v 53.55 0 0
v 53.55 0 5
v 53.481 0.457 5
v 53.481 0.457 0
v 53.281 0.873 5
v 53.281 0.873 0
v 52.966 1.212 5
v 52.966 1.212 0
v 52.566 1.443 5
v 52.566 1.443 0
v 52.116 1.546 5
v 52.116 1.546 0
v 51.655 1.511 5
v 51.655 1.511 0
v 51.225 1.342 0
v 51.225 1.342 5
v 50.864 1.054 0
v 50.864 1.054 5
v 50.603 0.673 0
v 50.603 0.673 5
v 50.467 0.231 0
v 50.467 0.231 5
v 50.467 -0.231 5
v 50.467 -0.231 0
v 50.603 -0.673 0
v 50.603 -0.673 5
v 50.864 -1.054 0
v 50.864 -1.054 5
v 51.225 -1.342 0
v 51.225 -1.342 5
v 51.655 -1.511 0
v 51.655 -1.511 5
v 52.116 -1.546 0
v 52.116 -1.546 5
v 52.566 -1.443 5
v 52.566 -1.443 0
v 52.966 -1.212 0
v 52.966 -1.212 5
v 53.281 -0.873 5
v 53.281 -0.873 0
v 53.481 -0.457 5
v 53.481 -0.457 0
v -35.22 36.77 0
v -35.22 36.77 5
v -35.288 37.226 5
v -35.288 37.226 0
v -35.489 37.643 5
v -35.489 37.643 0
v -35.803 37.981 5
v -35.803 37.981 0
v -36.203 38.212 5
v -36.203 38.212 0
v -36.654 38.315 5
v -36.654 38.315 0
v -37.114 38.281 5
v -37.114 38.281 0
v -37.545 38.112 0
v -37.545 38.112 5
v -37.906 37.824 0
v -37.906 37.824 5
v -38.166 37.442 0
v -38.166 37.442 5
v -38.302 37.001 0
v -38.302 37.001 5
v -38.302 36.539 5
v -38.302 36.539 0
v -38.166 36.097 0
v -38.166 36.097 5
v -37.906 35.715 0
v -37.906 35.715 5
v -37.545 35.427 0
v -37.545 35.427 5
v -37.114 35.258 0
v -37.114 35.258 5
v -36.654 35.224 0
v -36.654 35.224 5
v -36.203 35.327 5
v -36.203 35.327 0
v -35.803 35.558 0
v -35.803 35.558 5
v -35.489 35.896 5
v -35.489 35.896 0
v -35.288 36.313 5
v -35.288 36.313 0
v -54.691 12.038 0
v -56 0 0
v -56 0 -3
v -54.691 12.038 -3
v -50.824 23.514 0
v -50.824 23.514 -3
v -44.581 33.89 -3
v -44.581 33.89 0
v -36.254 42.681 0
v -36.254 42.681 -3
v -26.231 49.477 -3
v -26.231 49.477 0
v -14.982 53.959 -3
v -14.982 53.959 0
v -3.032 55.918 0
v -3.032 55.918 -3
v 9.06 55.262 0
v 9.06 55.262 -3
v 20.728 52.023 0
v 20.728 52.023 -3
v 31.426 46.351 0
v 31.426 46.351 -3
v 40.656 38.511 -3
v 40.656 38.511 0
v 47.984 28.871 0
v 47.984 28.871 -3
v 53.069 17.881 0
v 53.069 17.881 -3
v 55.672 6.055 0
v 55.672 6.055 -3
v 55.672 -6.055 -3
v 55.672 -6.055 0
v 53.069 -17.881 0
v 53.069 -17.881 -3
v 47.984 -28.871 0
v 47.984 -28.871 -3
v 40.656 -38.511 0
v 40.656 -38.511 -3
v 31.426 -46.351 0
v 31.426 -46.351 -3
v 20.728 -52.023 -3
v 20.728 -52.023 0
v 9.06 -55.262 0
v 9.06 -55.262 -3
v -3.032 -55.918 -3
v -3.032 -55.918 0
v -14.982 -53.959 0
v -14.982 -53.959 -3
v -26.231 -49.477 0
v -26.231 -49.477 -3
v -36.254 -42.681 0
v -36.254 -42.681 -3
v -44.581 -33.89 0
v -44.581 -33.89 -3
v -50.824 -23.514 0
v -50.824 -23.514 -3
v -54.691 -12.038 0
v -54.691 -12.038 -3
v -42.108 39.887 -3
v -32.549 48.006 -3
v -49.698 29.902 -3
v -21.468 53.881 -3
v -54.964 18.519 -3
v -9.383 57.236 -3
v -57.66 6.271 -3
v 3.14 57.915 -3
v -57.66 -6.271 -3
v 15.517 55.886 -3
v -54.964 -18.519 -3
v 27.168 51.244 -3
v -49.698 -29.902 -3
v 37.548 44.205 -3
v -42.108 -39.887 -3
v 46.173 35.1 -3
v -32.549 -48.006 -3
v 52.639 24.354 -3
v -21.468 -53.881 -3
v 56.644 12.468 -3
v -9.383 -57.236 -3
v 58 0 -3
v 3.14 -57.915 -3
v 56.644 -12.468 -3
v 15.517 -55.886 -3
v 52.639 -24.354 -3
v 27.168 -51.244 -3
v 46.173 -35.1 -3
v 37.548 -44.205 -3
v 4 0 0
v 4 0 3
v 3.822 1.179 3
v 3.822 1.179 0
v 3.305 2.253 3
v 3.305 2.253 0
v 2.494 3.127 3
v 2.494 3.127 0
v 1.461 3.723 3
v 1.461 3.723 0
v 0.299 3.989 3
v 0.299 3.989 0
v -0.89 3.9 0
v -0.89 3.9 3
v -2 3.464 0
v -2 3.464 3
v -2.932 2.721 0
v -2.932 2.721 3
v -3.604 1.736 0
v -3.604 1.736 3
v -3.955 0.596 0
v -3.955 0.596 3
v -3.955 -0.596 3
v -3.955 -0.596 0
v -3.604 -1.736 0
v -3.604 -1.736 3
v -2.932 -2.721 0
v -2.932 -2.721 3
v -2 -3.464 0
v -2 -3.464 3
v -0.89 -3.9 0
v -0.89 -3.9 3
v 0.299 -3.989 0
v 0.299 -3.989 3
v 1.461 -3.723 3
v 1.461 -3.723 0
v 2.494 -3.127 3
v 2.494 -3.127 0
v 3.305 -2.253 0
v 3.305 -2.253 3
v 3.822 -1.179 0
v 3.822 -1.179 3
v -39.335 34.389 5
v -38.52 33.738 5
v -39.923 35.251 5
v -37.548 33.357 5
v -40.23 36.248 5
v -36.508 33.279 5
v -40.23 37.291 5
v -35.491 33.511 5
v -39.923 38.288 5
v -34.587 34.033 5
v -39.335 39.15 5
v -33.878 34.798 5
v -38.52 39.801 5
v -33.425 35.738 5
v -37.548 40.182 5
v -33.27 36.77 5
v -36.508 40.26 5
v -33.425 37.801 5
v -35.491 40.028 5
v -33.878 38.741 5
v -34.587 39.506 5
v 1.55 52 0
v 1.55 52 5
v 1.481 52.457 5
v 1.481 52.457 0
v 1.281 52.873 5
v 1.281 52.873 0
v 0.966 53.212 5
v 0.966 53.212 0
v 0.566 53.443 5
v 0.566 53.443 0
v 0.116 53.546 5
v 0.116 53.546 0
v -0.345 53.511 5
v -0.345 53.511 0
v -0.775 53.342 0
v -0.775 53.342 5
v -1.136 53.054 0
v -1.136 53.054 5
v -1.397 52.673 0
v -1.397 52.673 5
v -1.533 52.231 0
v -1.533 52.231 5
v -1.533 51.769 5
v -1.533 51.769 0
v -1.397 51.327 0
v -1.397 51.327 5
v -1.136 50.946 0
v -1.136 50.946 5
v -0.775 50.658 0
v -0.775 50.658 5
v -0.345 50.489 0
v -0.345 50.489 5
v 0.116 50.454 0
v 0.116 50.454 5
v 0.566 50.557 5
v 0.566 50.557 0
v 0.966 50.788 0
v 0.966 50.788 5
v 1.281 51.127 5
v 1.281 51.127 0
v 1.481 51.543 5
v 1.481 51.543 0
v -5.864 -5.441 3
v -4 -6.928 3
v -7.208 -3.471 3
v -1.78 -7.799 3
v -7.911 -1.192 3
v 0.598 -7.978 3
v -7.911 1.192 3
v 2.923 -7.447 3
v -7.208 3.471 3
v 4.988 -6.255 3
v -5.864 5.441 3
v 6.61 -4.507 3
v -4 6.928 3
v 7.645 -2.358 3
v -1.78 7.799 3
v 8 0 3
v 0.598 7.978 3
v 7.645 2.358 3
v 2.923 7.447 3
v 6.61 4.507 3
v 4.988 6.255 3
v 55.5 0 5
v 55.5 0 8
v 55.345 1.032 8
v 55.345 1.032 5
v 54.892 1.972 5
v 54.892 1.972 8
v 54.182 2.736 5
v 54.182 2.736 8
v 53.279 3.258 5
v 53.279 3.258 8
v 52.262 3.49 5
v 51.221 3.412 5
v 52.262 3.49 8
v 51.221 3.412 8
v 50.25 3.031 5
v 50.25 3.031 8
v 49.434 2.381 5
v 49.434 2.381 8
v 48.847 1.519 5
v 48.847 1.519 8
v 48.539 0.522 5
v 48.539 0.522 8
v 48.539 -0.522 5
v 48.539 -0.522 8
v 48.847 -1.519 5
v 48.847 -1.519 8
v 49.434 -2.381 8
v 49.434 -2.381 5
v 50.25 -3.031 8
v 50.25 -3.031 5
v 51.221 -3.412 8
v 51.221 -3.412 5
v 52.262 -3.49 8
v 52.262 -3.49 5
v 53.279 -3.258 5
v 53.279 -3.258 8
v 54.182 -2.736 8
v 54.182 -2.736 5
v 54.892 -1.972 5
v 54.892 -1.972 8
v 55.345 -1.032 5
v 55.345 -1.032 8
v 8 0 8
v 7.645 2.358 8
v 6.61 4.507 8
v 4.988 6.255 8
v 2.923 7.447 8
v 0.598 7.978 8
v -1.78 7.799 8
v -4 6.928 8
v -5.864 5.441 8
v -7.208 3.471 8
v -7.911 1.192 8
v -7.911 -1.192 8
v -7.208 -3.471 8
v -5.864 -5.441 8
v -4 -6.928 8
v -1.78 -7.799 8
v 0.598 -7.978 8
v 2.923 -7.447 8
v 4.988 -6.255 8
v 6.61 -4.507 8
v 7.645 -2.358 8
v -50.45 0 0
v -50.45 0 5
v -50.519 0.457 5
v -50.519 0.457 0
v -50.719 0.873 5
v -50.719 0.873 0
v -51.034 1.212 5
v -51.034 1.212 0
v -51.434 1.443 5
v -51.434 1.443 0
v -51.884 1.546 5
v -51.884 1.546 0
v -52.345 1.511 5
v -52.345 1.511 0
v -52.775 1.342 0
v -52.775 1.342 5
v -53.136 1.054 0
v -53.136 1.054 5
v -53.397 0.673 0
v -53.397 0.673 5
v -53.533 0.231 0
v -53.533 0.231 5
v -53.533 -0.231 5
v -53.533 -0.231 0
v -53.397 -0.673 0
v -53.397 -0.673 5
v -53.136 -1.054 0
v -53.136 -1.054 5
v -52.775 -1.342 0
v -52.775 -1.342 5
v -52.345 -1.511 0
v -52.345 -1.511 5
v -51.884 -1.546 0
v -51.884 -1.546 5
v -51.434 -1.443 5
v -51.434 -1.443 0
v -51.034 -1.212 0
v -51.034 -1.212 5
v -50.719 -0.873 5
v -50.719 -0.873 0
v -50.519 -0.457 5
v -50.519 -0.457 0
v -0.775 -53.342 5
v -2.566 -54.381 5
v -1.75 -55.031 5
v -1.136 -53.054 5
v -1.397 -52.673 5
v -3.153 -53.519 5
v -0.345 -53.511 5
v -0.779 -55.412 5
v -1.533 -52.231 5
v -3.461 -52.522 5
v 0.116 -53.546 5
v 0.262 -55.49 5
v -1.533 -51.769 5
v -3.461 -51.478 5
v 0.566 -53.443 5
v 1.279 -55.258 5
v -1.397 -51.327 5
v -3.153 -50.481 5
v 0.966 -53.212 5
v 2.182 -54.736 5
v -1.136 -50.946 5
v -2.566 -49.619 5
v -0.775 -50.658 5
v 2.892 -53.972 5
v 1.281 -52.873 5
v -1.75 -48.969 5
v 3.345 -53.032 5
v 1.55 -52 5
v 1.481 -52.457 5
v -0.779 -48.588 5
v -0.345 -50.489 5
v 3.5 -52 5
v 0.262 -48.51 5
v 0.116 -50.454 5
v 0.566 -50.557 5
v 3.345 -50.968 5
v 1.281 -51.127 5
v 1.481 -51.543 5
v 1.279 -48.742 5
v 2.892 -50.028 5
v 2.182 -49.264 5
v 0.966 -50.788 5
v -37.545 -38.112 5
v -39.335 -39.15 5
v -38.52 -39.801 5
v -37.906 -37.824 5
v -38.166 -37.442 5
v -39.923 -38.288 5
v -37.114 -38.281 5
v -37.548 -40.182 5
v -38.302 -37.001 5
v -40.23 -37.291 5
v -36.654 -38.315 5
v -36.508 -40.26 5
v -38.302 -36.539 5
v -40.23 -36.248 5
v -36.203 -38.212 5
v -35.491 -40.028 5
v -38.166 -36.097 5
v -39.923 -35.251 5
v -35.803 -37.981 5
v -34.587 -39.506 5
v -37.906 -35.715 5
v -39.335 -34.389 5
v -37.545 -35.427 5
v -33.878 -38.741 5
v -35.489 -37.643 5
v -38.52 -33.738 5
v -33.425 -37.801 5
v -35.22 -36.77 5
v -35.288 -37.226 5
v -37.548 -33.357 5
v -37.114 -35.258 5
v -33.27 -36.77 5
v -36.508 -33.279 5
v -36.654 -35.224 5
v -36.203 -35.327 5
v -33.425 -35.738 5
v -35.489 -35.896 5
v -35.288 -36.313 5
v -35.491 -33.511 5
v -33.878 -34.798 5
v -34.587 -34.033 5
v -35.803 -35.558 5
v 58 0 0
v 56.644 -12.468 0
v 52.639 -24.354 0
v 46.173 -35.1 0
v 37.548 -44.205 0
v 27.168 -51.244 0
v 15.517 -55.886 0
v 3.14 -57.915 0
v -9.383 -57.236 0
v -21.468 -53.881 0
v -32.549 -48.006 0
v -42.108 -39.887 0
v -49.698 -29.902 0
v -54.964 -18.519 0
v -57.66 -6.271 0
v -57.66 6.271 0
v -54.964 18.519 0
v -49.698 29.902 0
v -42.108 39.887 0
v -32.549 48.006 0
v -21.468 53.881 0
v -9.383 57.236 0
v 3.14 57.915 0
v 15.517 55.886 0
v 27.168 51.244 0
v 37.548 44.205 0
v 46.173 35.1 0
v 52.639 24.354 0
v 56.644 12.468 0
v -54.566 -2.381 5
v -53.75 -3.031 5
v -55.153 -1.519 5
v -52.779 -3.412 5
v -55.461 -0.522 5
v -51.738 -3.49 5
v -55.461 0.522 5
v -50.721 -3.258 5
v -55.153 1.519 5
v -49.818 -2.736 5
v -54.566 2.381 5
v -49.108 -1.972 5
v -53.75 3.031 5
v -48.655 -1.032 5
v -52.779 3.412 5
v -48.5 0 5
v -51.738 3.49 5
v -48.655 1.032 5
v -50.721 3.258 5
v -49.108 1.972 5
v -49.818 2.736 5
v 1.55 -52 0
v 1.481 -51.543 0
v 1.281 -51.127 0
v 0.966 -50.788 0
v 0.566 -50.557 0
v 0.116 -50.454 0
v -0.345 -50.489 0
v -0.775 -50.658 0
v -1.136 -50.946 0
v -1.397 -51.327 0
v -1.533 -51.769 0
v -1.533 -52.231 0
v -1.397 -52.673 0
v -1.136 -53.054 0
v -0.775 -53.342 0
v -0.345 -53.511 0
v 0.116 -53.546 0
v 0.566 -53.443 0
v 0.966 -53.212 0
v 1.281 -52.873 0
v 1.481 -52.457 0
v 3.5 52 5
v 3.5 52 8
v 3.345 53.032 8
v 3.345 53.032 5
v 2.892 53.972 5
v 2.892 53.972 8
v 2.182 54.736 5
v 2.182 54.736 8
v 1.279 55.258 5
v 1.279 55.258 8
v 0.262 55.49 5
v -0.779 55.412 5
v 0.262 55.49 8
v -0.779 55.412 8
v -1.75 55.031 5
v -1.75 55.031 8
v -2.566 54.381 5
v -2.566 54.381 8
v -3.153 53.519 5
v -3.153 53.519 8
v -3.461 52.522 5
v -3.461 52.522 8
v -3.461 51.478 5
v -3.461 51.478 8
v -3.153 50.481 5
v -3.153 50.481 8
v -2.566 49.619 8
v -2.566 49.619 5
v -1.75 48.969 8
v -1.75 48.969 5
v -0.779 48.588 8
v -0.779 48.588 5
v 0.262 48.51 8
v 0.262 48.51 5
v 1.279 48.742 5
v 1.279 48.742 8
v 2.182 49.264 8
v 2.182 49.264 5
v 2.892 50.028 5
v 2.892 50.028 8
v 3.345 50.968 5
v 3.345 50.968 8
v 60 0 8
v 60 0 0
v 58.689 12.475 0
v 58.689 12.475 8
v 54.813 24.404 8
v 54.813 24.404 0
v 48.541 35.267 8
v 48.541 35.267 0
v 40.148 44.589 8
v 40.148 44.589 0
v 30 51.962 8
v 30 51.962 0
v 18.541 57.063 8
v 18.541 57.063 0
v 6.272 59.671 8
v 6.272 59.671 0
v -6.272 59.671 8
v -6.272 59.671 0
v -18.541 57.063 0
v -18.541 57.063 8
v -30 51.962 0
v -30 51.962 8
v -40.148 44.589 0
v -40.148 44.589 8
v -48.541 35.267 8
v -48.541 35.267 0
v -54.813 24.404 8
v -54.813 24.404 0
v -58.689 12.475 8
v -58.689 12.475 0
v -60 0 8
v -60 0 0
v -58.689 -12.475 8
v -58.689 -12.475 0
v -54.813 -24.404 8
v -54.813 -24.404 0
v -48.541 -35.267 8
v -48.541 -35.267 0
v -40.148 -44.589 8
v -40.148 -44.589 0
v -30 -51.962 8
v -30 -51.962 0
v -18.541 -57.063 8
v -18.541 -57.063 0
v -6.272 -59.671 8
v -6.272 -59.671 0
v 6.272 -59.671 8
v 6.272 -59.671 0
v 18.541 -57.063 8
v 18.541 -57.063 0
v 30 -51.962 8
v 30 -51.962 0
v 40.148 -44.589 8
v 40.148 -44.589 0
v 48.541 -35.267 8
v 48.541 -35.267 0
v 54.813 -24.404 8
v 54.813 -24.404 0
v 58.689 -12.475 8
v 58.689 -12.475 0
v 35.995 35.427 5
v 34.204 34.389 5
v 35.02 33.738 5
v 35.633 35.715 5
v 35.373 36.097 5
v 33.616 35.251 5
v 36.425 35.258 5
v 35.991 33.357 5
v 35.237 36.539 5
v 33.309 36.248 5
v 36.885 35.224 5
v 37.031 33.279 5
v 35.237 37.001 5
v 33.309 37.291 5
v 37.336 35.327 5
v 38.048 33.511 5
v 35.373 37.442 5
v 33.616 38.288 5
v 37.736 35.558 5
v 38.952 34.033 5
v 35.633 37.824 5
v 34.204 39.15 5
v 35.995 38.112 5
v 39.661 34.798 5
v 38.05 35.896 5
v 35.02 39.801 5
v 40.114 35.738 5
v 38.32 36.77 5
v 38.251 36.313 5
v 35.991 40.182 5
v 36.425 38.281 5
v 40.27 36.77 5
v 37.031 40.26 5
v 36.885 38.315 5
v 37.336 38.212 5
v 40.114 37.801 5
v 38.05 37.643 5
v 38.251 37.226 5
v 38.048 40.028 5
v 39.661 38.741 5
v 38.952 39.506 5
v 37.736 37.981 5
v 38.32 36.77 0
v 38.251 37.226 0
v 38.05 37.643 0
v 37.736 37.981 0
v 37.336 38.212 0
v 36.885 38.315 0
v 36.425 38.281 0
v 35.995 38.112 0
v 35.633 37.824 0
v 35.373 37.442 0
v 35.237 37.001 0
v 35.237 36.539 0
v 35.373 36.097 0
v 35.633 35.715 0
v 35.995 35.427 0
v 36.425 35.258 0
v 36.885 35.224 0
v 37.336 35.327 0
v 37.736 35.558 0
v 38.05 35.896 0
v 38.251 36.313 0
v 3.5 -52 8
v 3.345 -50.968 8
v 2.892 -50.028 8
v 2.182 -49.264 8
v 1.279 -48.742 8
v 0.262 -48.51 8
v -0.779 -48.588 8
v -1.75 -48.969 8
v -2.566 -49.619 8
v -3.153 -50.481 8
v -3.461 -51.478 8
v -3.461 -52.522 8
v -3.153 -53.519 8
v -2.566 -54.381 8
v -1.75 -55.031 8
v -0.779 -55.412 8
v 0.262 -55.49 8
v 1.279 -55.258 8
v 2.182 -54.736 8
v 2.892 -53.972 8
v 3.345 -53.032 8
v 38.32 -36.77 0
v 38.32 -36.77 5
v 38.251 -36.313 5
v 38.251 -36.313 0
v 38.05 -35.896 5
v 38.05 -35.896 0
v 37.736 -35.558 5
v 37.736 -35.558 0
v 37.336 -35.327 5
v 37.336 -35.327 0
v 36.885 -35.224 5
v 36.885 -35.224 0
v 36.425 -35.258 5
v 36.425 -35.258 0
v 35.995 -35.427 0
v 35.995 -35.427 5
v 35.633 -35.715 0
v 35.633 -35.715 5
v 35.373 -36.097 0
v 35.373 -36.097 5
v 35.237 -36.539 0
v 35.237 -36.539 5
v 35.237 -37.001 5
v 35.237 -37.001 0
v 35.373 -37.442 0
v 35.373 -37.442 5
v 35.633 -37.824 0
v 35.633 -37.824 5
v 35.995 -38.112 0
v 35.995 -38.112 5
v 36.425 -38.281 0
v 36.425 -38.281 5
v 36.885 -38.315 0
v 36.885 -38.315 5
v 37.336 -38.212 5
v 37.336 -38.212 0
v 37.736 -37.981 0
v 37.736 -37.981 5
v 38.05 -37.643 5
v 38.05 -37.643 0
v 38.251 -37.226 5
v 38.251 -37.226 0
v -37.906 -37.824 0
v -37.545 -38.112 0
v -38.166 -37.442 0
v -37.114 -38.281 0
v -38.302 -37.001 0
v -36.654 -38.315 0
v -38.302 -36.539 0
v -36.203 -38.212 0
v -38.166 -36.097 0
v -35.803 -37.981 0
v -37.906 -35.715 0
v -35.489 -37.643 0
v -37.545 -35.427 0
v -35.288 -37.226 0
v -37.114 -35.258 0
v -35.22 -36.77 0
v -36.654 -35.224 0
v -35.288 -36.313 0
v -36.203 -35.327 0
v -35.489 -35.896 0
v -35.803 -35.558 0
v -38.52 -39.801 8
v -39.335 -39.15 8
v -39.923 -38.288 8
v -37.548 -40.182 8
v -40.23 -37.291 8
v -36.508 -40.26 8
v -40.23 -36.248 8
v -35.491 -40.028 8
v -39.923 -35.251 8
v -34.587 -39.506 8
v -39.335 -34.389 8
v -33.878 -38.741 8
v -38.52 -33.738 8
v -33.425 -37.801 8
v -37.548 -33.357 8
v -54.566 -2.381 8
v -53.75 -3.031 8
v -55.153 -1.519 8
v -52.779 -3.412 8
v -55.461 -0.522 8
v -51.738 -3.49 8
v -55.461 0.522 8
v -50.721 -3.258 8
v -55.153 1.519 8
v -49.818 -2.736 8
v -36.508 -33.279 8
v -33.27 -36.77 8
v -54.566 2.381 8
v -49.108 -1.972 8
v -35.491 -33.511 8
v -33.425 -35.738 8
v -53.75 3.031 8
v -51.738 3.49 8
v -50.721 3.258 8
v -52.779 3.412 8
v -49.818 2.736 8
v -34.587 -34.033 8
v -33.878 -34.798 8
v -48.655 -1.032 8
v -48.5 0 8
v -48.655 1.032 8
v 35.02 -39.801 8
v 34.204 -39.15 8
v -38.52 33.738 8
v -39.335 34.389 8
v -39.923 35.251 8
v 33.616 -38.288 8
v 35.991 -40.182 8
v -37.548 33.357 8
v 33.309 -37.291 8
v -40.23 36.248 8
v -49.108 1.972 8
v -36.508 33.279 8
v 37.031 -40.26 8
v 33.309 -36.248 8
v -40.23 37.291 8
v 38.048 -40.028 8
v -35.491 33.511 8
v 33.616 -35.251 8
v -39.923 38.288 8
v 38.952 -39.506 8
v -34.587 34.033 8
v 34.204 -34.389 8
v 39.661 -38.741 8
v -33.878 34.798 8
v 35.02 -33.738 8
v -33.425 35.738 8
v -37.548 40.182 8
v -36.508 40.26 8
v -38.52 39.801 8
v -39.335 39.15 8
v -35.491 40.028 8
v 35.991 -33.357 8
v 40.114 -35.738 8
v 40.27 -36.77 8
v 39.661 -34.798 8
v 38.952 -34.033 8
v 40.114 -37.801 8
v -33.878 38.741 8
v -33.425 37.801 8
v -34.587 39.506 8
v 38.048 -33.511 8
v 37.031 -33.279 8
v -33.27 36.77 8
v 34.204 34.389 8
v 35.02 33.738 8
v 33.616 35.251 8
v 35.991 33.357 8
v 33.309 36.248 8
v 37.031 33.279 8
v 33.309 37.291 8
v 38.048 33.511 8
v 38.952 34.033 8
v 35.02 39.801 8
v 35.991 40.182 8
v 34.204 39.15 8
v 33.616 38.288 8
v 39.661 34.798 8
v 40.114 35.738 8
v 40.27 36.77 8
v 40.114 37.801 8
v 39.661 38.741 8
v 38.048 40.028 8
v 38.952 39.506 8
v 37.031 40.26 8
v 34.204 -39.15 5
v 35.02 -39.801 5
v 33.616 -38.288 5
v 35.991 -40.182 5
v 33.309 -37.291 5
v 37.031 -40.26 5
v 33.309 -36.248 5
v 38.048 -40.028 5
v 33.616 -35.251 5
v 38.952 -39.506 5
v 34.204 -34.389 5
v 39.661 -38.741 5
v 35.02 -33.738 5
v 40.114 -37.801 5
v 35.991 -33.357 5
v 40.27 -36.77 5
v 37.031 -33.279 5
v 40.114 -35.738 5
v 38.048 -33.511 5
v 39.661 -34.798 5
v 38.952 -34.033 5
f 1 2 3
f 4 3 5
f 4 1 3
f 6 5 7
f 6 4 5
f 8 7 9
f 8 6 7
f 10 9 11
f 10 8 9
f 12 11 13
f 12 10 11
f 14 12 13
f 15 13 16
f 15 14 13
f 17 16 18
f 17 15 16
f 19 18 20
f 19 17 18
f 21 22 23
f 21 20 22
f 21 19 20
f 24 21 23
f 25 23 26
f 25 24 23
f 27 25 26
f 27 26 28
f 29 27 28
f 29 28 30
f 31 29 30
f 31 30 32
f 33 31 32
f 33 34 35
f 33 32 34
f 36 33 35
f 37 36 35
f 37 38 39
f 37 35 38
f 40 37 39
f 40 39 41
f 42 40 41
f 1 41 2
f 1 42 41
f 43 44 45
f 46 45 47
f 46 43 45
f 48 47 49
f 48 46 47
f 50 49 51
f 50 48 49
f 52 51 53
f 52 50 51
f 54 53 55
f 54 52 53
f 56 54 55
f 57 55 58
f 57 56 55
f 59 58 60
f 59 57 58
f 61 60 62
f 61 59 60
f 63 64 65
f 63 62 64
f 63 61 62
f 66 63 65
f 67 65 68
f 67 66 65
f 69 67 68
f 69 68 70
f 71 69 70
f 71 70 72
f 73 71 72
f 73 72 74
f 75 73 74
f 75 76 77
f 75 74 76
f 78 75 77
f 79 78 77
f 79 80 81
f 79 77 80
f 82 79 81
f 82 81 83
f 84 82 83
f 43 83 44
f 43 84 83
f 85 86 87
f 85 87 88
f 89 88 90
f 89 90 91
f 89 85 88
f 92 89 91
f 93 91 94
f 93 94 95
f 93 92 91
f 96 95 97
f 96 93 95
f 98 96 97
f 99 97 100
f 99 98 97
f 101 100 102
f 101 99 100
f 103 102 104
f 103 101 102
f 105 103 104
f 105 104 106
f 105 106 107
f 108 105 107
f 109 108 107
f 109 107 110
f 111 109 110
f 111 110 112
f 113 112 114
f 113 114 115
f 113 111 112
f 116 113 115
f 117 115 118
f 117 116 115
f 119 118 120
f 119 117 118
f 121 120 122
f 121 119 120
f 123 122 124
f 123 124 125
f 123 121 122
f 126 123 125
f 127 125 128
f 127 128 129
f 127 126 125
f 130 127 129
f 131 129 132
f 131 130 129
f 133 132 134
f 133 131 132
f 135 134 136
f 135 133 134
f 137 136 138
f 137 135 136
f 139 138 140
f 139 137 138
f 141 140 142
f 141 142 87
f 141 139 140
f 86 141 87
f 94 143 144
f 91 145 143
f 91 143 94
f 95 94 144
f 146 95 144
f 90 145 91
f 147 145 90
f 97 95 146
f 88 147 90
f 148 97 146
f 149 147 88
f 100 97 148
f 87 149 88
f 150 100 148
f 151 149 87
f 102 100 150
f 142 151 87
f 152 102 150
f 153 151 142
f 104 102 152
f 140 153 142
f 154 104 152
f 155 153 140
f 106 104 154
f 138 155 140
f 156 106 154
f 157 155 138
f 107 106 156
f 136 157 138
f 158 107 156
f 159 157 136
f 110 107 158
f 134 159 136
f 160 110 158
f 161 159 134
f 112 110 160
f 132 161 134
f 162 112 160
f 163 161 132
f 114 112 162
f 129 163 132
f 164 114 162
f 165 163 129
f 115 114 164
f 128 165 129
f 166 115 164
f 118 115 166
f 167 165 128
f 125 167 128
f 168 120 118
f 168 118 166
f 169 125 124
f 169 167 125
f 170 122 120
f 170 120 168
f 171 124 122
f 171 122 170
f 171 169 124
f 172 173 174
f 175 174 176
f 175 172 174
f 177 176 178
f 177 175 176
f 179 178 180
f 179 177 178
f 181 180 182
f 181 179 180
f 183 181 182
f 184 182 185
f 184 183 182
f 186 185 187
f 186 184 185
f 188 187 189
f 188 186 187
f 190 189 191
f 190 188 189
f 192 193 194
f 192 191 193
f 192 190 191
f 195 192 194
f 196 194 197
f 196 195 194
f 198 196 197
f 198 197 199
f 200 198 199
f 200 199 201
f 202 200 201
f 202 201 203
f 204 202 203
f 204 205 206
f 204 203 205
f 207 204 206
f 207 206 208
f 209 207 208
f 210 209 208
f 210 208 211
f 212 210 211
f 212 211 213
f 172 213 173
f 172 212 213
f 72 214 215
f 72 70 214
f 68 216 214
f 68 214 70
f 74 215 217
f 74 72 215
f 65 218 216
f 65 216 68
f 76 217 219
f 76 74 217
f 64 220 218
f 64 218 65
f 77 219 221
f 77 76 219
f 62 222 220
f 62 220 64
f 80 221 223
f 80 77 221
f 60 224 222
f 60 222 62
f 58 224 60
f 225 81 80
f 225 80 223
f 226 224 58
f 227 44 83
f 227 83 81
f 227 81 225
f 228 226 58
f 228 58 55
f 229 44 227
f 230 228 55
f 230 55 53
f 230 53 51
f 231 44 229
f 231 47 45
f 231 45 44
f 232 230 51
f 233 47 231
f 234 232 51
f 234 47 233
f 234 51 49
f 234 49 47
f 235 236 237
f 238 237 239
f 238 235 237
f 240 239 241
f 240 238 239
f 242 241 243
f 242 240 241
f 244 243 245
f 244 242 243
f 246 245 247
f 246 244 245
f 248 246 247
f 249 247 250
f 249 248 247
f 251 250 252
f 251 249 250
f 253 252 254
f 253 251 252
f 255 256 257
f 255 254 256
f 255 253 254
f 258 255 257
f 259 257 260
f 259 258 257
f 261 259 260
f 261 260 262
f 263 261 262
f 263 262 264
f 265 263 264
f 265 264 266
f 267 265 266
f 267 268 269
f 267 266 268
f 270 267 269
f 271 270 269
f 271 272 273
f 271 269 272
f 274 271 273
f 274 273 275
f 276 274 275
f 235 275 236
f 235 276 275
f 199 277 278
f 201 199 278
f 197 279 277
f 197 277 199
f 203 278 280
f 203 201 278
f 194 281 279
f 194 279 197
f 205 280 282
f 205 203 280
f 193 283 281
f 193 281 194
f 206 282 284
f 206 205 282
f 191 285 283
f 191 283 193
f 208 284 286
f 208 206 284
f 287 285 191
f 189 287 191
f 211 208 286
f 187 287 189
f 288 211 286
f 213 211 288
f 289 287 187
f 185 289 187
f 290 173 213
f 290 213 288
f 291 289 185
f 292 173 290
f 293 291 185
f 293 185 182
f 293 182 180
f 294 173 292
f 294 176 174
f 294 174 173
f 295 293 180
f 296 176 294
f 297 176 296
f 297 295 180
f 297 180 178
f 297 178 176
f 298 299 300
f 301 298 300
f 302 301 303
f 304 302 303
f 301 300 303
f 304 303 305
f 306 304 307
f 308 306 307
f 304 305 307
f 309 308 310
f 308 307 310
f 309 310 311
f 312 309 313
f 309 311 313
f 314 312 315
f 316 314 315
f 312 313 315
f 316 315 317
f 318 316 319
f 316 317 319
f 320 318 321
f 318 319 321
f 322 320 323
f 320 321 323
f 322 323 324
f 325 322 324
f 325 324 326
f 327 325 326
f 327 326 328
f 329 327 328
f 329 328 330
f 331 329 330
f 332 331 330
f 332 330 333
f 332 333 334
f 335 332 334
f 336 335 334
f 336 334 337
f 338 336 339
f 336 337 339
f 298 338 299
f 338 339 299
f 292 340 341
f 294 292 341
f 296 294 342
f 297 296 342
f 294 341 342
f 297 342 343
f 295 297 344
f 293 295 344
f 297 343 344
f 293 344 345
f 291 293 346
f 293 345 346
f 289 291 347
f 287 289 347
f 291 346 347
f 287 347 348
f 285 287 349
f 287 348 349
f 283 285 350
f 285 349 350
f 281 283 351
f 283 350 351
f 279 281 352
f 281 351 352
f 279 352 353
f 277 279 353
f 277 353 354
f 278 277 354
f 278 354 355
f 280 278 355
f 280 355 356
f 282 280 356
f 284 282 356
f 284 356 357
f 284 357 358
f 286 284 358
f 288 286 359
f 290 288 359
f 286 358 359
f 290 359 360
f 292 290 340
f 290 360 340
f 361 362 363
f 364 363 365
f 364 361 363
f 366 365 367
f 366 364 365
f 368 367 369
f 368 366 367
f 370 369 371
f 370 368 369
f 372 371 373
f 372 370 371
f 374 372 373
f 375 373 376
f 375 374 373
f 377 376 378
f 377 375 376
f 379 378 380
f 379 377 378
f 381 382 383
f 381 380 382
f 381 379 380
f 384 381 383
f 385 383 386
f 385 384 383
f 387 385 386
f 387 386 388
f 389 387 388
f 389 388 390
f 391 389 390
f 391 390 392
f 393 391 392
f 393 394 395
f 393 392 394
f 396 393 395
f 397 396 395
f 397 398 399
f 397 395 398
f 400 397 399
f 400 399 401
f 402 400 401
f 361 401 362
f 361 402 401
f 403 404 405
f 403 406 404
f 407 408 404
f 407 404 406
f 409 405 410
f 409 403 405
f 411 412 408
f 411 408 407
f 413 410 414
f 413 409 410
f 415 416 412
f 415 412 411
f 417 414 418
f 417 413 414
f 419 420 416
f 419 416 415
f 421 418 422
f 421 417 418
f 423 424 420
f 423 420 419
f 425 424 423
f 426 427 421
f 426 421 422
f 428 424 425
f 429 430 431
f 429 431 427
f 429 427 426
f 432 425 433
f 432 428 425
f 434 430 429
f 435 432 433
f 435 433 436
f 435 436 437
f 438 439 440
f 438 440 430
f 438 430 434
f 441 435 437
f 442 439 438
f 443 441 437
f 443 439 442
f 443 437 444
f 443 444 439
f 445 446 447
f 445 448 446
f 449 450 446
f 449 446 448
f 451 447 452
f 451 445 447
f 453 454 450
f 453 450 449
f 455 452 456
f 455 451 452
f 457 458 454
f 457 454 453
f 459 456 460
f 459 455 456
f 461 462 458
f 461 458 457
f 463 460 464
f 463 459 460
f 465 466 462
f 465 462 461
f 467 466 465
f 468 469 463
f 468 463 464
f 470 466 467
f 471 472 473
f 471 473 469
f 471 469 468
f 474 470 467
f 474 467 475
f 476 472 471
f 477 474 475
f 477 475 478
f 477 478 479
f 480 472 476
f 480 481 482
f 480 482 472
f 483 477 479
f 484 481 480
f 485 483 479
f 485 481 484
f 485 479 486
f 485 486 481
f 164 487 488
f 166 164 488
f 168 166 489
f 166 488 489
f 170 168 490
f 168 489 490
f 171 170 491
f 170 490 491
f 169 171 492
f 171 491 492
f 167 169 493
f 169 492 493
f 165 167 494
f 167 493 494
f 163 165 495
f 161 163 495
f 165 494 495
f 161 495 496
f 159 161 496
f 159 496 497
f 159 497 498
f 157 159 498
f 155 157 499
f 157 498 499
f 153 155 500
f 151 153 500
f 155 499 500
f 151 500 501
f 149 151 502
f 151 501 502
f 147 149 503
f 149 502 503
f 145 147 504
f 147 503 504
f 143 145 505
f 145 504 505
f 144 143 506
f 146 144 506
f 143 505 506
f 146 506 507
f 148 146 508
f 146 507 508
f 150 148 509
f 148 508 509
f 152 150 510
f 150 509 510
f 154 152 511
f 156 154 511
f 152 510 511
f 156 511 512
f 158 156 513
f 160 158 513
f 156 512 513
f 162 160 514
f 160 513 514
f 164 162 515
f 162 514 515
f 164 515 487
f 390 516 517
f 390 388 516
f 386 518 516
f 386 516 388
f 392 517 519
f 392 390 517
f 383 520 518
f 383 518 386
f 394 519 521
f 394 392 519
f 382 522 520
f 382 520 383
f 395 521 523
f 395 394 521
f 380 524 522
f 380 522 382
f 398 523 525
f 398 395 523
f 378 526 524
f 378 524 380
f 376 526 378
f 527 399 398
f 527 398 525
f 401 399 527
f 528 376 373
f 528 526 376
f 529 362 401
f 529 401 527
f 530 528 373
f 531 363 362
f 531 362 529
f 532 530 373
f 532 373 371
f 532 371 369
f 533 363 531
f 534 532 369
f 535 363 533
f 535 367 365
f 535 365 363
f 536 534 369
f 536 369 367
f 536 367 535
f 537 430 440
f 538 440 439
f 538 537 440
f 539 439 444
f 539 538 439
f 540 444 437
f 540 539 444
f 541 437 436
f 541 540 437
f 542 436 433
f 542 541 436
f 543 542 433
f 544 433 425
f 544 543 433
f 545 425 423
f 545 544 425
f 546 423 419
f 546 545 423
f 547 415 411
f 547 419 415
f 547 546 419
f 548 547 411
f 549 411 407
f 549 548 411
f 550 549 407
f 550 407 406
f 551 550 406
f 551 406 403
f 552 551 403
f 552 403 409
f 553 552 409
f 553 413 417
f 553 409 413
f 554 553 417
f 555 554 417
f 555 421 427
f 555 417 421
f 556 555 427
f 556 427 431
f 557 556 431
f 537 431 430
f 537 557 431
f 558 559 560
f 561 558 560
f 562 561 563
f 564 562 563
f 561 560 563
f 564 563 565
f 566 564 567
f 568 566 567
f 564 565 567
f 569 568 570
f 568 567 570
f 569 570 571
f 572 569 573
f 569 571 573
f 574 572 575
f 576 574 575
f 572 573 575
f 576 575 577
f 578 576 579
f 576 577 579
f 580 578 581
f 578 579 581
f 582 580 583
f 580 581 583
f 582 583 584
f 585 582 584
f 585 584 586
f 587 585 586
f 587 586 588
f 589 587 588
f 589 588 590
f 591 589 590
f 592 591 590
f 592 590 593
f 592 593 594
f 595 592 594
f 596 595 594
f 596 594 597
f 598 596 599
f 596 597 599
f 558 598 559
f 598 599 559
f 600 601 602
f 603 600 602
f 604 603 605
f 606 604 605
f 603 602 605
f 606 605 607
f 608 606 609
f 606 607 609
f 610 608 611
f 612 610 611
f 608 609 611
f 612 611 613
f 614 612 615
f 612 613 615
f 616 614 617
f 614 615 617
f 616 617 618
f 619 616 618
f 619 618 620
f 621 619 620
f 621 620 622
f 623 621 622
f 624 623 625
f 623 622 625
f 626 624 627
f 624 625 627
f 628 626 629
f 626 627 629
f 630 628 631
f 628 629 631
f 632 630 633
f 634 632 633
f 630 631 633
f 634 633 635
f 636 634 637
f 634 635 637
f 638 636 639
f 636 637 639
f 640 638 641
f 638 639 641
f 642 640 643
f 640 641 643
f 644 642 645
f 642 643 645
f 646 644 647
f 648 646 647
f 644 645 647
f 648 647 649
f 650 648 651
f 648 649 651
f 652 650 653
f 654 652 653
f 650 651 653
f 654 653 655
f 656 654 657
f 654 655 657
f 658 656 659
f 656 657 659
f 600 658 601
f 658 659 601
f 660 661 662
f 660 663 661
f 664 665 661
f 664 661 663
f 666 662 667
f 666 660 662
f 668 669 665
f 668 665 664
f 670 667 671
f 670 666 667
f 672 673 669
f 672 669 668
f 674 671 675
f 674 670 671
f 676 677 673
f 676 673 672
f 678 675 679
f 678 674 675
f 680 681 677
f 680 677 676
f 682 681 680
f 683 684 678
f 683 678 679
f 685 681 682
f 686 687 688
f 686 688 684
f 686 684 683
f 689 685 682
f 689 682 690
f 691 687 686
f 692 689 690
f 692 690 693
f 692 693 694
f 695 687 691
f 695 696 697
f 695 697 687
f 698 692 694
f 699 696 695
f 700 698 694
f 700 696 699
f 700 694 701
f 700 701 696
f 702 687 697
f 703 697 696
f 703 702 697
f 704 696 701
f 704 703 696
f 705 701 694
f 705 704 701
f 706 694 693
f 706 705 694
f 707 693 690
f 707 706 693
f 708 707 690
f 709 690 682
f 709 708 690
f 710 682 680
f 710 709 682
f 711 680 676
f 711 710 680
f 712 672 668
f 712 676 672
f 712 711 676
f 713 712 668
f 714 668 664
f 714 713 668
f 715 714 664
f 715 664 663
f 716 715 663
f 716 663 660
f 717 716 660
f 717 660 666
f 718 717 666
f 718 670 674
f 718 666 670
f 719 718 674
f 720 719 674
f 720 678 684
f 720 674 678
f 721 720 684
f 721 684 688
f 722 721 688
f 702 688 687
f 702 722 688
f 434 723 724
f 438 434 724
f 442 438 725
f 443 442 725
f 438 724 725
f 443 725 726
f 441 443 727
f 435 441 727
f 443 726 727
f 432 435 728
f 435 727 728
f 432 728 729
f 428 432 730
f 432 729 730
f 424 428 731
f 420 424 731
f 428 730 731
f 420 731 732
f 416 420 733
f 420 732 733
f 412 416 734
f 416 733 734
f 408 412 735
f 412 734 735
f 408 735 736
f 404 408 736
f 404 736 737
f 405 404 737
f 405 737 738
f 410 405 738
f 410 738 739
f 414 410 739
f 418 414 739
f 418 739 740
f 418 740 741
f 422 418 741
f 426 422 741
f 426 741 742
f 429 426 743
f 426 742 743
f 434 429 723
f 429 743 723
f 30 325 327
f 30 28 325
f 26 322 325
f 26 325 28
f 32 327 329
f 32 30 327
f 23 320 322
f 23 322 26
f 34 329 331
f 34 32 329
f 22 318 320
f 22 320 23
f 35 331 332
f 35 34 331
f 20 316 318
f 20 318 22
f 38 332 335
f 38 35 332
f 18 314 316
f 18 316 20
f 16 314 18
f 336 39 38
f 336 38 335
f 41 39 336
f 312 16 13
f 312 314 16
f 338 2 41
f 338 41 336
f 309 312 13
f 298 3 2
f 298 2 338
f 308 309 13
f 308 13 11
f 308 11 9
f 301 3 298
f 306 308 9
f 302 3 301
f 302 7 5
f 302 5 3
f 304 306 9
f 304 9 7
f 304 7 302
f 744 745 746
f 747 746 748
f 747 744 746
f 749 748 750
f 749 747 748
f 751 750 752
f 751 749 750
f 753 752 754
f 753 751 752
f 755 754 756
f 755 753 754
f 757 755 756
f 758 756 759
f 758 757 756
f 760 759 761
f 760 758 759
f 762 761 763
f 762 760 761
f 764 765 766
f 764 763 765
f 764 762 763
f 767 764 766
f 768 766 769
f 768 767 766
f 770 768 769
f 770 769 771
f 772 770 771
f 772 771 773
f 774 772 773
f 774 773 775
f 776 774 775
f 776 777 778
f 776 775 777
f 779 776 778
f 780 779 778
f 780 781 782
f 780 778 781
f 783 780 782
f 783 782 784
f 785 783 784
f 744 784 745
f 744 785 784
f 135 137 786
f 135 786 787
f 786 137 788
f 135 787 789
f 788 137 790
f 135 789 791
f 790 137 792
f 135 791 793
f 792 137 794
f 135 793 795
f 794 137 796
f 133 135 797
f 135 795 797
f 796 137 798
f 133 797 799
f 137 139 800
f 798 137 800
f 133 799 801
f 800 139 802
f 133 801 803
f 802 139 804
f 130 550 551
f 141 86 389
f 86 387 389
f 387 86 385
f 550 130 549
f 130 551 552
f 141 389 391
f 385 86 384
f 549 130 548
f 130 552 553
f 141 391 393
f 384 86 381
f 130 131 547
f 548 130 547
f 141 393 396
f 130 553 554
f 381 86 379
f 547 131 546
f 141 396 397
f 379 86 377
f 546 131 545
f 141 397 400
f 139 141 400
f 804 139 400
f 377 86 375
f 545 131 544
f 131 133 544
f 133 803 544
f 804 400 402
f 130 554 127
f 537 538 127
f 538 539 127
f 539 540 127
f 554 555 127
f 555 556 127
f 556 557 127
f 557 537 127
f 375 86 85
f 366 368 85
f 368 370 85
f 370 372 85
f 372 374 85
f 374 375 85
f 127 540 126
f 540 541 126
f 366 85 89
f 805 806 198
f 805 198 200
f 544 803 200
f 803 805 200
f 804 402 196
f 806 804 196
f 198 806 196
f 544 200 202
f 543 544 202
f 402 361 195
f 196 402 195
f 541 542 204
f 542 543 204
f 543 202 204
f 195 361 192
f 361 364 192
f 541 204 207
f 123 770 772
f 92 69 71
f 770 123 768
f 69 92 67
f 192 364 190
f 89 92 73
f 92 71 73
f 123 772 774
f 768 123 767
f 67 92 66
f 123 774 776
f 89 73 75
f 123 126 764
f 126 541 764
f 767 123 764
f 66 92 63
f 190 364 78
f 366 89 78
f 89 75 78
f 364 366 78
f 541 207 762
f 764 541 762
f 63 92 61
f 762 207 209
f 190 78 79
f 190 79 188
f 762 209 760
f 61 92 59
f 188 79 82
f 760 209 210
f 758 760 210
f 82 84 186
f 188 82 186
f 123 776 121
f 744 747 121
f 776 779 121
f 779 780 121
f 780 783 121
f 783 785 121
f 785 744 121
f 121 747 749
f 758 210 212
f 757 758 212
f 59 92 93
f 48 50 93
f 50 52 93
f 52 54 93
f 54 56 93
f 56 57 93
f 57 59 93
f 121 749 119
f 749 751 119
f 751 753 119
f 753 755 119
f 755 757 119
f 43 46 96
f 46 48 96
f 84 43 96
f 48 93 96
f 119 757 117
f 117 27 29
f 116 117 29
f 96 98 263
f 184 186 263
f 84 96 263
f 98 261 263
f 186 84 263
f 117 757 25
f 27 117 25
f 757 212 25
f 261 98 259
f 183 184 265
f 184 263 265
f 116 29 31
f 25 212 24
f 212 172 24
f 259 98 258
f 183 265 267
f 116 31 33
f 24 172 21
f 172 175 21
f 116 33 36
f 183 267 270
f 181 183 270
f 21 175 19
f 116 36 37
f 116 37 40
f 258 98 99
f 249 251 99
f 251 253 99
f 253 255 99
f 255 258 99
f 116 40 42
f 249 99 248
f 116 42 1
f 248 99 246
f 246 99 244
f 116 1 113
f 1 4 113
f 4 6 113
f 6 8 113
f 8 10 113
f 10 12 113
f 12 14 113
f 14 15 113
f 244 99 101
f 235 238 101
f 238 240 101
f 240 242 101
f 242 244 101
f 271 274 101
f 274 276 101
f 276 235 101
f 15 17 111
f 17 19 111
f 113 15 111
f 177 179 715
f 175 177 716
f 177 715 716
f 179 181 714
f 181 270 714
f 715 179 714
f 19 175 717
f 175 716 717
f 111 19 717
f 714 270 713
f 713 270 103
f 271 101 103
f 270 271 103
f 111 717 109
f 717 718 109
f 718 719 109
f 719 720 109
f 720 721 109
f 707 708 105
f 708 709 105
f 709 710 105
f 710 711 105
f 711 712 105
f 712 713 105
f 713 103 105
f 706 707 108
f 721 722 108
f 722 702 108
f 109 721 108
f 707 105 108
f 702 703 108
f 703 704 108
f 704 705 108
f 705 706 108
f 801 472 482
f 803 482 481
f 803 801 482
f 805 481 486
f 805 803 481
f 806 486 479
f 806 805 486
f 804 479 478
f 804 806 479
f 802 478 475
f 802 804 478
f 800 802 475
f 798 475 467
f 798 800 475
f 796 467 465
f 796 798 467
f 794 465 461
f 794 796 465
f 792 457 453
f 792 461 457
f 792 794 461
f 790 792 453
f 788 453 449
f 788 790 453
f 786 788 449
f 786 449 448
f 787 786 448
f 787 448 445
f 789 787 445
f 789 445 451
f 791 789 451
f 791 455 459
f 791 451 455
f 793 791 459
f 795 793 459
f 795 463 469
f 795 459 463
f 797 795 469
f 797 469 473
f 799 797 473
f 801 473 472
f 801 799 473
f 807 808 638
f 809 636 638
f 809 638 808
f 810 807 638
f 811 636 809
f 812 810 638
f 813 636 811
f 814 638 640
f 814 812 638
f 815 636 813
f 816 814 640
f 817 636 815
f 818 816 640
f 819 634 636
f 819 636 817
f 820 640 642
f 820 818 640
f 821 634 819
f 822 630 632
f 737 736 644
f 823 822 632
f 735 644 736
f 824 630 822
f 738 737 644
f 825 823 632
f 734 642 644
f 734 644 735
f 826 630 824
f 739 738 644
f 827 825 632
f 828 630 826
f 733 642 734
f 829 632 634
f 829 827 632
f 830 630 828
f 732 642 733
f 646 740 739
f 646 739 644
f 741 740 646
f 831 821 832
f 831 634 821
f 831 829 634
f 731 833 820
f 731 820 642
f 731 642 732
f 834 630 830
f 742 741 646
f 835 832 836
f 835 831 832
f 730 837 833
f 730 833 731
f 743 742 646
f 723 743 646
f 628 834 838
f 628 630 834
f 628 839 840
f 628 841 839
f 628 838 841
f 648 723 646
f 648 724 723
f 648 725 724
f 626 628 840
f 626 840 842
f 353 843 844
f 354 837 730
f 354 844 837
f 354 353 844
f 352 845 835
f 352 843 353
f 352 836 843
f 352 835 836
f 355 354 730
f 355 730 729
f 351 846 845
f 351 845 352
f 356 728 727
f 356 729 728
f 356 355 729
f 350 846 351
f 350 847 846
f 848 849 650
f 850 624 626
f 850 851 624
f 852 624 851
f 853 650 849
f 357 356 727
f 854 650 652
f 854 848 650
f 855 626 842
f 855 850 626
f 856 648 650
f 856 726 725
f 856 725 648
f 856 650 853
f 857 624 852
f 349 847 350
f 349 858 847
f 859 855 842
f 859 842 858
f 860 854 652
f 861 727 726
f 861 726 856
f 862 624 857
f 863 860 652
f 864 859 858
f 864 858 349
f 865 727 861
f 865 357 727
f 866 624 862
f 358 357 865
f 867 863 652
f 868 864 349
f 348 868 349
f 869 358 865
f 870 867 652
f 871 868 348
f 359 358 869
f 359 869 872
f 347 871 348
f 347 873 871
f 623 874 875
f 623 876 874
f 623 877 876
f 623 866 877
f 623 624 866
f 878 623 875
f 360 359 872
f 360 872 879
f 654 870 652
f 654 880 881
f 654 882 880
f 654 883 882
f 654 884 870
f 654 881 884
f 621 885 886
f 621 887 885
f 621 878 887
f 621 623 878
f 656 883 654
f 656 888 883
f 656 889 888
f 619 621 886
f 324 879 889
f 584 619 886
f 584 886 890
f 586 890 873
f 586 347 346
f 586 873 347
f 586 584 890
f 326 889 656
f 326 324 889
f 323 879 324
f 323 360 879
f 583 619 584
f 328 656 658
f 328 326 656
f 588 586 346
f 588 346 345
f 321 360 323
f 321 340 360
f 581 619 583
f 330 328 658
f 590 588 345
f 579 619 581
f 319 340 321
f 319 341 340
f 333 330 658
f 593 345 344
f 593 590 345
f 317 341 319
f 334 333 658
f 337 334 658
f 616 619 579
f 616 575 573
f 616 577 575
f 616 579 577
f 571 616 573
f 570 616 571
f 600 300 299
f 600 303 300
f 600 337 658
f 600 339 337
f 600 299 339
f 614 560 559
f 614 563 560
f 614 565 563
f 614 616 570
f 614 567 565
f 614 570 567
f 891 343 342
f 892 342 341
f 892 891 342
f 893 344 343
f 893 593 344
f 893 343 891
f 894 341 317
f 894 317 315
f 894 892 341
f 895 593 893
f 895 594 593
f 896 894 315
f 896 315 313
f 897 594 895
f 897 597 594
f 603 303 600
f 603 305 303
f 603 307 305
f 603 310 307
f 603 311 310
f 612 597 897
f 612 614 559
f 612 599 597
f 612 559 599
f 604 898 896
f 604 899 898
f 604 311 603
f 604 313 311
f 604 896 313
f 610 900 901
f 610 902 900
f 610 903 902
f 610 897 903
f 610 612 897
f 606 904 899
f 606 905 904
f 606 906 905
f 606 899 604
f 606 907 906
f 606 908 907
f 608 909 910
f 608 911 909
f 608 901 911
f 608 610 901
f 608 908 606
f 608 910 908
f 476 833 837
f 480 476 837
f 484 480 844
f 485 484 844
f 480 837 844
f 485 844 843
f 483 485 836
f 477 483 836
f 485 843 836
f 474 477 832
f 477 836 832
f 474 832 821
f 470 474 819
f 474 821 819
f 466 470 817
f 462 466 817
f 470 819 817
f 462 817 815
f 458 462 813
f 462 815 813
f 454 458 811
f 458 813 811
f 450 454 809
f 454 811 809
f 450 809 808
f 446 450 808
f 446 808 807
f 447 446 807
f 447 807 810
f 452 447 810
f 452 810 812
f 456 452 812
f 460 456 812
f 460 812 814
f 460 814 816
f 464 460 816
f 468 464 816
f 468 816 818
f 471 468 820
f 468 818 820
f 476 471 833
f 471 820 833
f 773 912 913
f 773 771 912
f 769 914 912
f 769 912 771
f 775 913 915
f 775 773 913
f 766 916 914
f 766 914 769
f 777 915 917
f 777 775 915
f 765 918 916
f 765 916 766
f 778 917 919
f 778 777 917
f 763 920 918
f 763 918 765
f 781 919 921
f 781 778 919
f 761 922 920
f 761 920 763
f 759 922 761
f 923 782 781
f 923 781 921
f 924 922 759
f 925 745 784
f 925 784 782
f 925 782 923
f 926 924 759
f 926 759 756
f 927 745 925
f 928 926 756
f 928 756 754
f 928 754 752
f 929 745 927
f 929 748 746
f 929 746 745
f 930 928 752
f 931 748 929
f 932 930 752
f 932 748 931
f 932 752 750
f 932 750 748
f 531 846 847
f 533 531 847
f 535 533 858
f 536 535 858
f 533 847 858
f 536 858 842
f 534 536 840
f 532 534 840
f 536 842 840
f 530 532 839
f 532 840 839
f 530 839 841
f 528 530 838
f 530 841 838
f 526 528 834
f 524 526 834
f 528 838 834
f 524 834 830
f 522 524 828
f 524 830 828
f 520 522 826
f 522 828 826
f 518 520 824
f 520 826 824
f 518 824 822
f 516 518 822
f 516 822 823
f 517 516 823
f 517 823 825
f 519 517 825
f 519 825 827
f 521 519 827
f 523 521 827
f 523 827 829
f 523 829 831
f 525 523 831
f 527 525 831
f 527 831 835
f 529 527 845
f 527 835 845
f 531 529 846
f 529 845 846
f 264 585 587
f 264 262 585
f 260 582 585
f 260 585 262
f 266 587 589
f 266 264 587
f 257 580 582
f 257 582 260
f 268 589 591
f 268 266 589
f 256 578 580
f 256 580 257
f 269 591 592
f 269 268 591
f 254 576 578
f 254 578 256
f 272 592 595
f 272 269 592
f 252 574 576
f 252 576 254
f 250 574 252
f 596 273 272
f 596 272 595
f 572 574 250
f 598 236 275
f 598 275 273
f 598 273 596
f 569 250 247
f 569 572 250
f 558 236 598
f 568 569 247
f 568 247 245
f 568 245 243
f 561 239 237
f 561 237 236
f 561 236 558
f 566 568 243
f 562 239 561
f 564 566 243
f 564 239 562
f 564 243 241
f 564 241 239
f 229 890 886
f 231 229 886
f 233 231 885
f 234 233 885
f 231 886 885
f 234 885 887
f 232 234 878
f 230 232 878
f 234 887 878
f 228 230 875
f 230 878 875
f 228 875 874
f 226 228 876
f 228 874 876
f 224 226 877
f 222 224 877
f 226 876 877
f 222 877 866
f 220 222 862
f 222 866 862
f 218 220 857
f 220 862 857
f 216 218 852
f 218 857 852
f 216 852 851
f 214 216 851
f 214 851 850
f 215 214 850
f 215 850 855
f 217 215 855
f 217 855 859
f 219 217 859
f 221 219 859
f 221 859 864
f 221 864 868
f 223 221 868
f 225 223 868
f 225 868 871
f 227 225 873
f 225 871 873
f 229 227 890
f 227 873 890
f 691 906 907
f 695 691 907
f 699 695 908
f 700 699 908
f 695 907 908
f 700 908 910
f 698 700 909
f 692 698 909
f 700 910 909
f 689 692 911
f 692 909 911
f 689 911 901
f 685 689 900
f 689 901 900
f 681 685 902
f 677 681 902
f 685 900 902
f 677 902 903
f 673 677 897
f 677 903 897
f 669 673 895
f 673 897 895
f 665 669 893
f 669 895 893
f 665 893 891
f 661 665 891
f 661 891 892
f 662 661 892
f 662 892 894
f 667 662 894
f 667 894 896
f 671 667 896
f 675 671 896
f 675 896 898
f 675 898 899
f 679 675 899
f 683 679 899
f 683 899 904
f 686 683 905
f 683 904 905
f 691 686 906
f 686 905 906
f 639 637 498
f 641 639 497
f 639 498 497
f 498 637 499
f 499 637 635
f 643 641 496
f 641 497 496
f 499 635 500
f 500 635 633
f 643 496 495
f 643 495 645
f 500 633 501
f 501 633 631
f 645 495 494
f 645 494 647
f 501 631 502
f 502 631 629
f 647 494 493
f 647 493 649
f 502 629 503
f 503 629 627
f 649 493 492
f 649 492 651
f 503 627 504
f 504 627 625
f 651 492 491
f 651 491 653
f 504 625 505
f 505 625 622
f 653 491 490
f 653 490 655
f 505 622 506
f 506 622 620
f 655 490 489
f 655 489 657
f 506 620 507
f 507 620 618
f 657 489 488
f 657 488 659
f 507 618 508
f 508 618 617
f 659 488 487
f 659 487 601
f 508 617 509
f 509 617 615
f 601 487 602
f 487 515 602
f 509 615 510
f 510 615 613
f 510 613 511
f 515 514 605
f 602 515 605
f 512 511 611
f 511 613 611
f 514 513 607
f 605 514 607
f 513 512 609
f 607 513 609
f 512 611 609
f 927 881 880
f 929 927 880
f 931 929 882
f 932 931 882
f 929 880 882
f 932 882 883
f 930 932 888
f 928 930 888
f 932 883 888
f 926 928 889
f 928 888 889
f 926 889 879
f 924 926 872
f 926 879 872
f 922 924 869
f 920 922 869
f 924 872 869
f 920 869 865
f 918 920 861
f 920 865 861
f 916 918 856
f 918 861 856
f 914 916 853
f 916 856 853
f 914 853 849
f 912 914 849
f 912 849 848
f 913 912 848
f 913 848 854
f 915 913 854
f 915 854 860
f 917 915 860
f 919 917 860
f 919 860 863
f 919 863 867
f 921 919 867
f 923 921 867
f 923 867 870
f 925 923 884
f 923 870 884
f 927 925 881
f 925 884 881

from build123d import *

# Parameters (mm, degrees)
SKETCH1_R           = 60
SKETCH1_R_2         = 4
SKETCH1_R_3         = 1.55
BOSS_EXTRUDE2_DEPTH = 8
SKETCH2_R           = 8
CUT_EXTRUDE1_DEPTH  = 5
SKETCH3_R           = 3.5
CUT_EXTRUDE2_DEPTH  = 3
SKETCH4_R           = 58
SKETCH4_R_2         = 56
BOSS_EXTRUDE3_DEPTH = 3


with BuildPart() as part:
    # Sketch1 → Boss-Extrude2 (new body)
    with BuildSketch(Plane.XY):
        Circle(SKETCH1_R)
        Circle(SKETCH1_R_2, mode=Mode.SUBTRACT)
        with Locations((-36.769552622, 36.769552622)):
            Circle(SKETCH1_R_3, mode=Mode.SUBTRACT)
        with Locations((0, 52)):
            Circle(SKETCH1_R_3, mode=Mode.SUBTRACT)
        with Locations((36.769552622, 36.769552622)):
            Circle(SKETCH1_R_3, mode=Mode.SUBTRACT)
        with Locations((52, 0)):
            Circle(SKETCH1_R_3, mode=Mode.SUBTRACT)
        with Locations((36.769552622, -36.769552622)):
            Circle(SKETCH1_R_3, mode=Mode.SUBTRACT)
        with Locations((0, -52)):
            Circle(SKETCH1_R_3, mode=Mode.SUBTRACT)
        with Locations((-36.769552622, -36.769552622)):
            Circle(SKETCH1_R_3, mode=Mode.SUBTRACT)
        with Locations((-52, 0)):
            Circle(SKETCH1_R_3, mode=Mode.SUBTRACT)
    extrude(amount=BOSS_EXTRUDE2_DEPTH)

    # Sketch2 → Cut-Extrude1 (cut)
    with BuildSketch(Plane.XY.offset(8)):
        Circle(SKETCH2_R)
    extrude(amount=-CUT_EXTRUDE1_DEPTH, mode=Mode.SUBTRACT)

    # Sketch3 → Cut-Extrude2 (cut)
    with BuildSketch(Plane.XY.offset(8)):
        with Locations((0, 52)):
            Circle(SKETCH3_R)
        with Locations((36.769552622, 36.769552622)):
            Circle(SKETCH3_R)
        with Locations((52, 0)):
            Circle(SKETCH3_R)
        with Locations((36.769552622, -36.769552622)):
            Circle(SKETCH3_R)
        with Locations((0, -52)):
            Circle(SKETCH3_R)
        with Locations((-36.769552622, -36.769552622)):
            Circle(SKETCH3_R)
        with Locations((-52, 0)):
            Circle(SKETCH3_R)
        with Locations((-36.769552622, 36.769552622)):
            Circle(SKETCH3_R)
    extrude(amount=-CUT_EXTRUDE2_DEPTH, mode=Mode.SUBTRACT)

    # Sketch4 → Boss-Extrude3 (add)
    with BuildSketch(Plane(origin=(0, 0, 0), x_dir=(-1, 0, 0), z_dir=(0, 0, -1))):
        with Locations(Location((0, 0, 0), (0, 0, 180))):
            Circle(SKETCH4_R)
        Circle(SKETCH4_R_2, mode=Mode.SUBTRACT)
    extrude(amount=BOSS_EXTRUDE3_DEPTH)


solid = part.part
